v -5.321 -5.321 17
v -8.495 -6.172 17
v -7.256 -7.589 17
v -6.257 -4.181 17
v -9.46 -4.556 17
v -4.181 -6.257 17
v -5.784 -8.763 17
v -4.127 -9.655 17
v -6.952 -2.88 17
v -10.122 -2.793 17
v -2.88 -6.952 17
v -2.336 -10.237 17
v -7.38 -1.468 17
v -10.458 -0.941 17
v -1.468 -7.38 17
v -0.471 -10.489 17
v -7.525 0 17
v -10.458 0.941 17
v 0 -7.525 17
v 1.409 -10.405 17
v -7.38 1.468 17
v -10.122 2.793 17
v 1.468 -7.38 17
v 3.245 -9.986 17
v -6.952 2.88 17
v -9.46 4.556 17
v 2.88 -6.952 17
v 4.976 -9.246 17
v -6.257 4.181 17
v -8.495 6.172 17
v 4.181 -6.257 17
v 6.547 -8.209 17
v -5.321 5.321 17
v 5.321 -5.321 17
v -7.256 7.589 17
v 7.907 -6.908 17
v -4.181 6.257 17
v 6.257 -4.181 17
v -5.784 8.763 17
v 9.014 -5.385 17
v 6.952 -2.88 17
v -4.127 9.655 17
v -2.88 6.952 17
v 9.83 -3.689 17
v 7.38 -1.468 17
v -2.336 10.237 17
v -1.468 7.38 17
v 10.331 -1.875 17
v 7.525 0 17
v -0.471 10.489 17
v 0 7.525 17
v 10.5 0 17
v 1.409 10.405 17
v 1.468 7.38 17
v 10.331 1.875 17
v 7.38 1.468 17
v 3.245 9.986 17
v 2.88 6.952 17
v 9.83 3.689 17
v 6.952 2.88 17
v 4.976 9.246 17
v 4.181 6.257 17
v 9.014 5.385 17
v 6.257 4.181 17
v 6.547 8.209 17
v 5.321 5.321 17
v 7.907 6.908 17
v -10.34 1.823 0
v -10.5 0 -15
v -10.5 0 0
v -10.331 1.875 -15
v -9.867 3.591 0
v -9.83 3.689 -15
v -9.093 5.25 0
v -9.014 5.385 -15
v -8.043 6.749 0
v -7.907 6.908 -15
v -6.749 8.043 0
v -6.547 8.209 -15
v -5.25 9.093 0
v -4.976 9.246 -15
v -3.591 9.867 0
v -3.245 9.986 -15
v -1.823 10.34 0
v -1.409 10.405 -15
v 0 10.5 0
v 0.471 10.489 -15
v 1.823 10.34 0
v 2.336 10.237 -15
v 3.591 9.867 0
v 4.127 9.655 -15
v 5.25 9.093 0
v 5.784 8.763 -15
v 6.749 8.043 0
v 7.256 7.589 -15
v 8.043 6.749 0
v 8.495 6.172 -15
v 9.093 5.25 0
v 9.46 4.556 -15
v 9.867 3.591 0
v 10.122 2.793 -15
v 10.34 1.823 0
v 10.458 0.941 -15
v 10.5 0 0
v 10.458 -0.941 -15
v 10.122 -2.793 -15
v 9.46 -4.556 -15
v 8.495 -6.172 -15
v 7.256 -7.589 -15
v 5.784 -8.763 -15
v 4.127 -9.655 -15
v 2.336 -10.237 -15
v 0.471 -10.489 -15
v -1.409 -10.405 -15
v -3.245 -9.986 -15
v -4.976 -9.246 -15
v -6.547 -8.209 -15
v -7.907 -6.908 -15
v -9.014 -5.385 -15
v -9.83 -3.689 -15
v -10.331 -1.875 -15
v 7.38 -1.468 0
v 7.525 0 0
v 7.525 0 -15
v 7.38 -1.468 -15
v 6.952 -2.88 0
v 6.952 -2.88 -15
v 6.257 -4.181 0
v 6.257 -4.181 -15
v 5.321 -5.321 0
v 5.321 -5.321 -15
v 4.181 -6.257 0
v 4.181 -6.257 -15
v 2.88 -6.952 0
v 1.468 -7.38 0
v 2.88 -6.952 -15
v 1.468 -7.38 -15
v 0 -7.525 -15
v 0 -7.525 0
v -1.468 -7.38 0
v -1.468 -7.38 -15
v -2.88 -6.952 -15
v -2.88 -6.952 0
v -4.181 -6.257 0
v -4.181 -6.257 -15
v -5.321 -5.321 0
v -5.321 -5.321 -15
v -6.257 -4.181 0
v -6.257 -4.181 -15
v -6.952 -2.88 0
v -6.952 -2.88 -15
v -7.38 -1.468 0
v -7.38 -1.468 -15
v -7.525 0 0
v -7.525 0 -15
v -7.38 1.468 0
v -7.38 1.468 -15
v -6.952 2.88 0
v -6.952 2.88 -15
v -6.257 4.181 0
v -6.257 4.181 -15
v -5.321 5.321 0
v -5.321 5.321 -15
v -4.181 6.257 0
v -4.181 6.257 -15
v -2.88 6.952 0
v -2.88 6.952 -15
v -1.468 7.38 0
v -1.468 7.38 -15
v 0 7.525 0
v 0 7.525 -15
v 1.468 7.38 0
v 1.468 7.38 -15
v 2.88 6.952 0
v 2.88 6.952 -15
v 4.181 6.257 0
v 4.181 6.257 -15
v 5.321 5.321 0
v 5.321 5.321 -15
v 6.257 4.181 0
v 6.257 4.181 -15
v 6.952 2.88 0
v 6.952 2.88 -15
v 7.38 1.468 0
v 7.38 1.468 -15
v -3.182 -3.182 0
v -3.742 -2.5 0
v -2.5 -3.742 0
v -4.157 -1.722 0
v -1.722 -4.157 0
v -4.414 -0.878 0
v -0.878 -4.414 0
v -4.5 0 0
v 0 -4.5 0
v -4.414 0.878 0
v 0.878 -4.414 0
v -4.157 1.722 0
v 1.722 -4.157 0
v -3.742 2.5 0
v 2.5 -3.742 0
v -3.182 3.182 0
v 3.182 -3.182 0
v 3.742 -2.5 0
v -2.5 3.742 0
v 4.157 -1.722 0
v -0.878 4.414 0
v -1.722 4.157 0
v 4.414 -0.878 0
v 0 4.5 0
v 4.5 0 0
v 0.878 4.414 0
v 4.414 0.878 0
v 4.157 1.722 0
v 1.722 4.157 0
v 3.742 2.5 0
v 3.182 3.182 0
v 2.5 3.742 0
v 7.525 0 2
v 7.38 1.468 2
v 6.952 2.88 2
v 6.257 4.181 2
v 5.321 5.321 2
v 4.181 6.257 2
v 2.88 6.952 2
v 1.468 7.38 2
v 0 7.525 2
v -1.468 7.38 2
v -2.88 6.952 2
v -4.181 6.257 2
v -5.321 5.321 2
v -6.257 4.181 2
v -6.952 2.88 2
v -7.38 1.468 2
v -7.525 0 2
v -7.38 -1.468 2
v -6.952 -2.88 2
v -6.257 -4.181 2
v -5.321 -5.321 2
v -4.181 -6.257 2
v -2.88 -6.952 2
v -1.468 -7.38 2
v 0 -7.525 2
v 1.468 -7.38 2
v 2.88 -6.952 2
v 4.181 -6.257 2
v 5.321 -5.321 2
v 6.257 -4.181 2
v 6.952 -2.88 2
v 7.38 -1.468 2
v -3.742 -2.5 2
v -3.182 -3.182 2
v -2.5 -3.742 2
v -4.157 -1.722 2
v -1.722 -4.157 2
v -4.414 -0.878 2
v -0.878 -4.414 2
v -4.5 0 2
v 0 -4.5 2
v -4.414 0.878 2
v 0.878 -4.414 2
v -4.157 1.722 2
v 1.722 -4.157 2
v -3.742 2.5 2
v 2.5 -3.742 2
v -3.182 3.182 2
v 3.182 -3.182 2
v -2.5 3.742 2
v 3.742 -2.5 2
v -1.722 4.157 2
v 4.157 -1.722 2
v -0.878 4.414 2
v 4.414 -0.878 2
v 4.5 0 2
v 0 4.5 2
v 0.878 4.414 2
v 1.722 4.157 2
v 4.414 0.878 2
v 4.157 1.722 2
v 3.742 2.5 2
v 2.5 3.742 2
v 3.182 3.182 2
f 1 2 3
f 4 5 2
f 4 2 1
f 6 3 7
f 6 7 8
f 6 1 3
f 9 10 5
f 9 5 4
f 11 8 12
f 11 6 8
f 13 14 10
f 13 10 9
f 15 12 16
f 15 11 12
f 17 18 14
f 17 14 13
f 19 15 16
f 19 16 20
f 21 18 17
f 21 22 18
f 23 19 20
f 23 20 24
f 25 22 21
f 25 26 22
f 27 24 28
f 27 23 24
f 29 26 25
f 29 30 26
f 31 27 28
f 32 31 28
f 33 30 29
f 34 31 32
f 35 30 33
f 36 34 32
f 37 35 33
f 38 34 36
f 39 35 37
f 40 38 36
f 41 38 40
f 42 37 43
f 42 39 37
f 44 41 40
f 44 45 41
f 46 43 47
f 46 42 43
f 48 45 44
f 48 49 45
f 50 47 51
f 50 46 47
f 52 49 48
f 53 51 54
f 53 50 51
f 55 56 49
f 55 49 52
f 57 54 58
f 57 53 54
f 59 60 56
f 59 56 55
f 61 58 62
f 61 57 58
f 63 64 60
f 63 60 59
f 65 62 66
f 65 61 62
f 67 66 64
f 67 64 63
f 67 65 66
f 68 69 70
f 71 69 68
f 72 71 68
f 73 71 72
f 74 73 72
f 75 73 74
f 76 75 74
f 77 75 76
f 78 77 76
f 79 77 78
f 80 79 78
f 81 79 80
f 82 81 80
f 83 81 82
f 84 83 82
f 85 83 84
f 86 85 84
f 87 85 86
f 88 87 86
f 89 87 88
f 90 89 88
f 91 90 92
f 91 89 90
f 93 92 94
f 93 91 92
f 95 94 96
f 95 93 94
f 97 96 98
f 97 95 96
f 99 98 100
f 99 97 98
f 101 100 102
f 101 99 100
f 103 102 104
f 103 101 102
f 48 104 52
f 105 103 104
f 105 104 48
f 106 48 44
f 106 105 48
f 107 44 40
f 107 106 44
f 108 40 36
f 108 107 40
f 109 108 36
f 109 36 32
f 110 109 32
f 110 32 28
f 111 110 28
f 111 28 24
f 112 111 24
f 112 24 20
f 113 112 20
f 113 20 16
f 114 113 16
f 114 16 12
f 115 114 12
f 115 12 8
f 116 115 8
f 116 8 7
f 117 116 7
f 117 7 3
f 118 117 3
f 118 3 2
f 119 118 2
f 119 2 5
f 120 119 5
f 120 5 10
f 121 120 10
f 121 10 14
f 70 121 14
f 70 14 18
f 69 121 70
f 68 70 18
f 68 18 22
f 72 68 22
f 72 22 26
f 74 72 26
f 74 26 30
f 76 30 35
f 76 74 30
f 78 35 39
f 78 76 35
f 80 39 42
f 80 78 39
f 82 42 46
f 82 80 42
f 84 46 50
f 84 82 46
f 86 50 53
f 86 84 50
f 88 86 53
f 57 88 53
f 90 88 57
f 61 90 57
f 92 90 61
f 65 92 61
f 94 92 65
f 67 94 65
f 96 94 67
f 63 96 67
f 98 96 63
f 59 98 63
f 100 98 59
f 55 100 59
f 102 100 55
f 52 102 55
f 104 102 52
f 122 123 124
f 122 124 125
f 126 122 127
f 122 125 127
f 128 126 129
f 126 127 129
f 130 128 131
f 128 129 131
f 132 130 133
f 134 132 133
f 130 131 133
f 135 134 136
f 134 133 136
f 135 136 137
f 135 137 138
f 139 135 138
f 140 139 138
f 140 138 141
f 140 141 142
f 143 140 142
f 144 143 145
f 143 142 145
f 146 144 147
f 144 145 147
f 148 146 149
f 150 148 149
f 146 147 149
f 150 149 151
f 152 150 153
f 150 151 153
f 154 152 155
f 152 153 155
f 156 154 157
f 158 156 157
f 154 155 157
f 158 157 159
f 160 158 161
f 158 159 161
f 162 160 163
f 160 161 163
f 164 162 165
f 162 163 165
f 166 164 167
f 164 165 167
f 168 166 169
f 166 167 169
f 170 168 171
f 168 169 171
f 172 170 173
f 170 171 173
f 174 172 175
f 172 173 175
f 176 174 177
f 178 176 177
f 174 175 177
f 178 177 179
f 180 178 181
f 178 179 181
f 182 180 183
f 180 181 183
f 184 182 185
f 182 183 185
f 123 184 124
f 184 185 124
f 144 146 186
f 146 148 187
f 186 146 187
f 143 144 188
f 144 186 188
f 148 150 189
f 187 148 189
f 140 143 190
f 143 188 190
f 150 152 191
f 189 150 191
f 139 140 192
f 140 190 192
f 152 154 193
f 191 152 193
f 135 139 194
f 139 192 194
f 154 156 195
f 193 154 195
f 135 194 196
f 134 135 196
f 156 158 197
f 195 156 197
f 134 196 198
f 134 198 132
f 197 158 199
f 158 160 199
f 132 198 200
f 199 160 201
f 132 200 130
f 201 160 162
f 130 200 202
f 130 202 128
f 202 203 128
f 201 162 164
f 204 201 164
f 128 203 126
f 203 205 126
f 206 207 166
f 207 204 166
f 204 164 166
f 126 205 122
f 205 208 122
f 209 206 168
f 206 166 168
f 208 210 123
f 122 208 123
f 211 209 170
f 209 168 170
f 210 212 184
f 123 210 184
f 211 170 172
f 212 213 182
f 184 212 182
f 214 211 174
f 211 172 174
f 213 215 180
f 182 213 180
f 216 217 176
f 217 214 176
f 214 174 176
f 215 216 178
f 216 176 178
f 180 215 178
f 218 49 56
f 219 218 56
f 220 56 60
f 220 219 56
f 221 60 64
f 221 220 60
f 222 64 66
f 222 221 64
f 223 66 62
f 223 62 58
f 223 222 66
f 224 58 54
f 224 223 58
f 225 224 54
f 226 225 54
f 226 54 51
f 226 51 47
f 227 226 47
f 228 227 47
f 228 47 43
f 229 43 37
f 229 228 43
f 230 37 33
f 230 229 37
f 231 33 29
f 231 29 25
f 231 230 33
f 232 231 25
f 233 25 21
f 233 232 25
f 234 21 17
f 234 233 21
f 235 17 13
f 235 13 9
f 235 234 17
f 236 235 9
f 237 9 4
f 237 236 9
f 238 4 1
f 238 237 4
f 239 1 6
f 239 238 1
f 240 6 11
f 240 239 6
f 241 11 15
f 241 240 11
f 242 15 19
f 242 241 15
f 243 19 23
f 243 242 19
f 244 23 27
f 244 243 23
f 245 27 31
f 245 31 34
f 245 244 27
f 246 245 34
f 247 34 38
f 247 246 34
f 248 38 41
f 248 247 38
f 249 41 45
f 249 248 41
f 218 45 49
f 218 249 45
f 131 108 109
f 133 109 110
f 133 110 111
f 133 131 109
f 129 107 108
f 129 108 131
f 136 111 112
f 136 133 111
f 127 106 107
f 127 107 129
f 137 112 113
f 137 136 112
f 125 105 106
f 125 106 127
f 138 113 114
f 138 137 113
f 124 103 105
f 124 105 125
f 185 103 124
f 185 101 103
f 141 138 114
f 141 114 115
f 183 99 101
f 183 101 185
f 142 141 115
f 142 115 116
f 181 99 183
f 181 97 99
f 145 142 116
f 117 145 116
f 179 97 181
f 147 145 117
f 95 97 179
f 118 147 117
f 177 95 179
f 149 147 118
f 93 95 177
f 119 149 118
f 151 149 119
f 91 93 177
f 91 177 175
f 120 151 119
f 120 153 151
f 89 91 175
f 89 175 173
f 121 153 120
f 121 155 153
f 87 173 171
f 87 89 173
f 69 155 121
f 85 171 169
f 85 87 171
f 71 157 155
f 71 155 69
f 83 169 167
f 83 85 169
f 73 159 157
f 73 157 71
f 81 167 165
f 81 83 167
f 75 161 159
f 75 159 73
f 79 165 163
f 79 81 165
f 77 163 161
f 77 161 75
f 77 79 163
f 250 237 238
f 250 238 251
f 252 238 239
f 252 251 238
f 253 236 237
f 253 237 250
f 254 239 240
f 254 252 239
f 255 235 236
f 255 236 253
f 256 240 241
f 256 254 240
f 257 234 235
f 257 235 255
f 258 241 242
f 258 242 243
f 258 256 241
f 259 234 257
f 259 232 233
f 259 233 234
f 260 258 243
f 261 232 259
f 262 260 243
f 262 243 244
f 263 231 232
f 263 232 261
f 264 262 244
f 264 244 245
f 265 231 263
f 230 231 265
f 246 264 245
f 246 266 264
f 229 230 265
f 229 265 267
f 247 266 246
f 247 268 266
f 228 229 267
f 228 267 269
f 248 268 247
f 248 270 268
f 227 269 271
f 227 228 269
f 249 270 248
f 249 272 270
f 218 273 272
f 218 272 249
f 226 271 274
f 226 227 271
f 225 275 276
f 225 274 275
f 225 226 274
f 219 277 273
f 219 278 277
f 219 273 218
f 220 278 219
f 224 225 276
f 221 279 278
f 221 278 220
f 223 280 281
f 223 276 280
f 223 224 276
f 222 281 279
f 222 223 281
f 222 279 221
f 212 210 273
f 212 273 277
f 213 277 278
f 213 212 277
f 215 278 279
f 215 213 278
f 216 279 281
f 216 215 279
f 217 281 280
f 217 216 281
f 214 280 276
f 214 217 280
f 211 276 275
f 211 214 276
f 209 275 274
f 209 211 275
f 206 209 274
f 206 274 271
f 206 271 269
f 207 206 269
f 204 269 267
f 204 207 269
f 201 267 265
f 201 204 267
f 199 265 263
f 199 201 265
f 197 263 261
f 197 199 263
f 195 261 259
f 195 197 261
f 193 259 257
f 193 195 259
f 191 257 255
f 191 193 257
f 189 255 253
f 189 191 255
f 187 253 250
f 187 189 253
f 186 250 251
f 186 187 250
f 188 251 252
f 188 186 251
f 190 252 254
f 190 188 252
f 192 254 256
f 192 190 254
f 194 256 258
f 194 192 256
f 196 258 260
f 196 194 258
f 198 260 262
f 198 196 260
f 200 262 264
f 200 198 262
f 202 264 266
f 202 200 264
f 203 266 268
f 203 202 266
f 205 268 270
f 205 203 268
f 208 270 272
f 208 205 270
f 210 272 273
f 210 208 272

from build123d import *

# Parameters (mm, degrees)
SKETCH_1_R      = 10.5
SKETCH_1_R_2    = 4.5
EXTRUDE_1_DEPTH = 2
SKETCH_2_R      = 10.5
SKETCH_2_R_2    = 7.525
EXTRUDE_2_DEPTH = 15
EXTRUDE_START   = 15
SKETCH_3_R      = 10.5
SKETCH_3_R_2    = 7.525
EXTRUDE_3_DEPTH = 15


with BuildPart() as part:
    # 草图1 → 凸台-拉伸1 (new body)
    with BuildSketch(Plane.XY):
        Circle(SKETCH_1_R)
        Circle(SKETCH_1_R_2, mode=Mode.SUBTRACT)
    extrude(amount=EXTRUDE_1_DEPTH)

    # 草图2 → 凸台-拉伸2 (add)
    with BuildSketch(Plane.XY.offset(2)):
        Circle(SKETCH_2_R)
        Circle(SKETCH_2_R_2, mode=Mode.SUBTRACT)
    extrude(amount=EXTRUDE_2_DEPTH)

    # 草图3 → 凸台-拉伸3 (add)
    with BuildSketch(Plane(origin=(0, 0, 0), x_dir=(-1, 0, 0), z_dir=(0, 0, -1)).offset(EXTRUDE_START)):
        Circle(SKETCH_3_R)
        with Locations(Location((0, 0, 0), (0, 0, 180))):
            Circle(SKETCH_3_R_2, mode=Mode.SUBTRACT)
    extrude(amount=-EXTRUDE_3_DEPTH)


solid = part.part
